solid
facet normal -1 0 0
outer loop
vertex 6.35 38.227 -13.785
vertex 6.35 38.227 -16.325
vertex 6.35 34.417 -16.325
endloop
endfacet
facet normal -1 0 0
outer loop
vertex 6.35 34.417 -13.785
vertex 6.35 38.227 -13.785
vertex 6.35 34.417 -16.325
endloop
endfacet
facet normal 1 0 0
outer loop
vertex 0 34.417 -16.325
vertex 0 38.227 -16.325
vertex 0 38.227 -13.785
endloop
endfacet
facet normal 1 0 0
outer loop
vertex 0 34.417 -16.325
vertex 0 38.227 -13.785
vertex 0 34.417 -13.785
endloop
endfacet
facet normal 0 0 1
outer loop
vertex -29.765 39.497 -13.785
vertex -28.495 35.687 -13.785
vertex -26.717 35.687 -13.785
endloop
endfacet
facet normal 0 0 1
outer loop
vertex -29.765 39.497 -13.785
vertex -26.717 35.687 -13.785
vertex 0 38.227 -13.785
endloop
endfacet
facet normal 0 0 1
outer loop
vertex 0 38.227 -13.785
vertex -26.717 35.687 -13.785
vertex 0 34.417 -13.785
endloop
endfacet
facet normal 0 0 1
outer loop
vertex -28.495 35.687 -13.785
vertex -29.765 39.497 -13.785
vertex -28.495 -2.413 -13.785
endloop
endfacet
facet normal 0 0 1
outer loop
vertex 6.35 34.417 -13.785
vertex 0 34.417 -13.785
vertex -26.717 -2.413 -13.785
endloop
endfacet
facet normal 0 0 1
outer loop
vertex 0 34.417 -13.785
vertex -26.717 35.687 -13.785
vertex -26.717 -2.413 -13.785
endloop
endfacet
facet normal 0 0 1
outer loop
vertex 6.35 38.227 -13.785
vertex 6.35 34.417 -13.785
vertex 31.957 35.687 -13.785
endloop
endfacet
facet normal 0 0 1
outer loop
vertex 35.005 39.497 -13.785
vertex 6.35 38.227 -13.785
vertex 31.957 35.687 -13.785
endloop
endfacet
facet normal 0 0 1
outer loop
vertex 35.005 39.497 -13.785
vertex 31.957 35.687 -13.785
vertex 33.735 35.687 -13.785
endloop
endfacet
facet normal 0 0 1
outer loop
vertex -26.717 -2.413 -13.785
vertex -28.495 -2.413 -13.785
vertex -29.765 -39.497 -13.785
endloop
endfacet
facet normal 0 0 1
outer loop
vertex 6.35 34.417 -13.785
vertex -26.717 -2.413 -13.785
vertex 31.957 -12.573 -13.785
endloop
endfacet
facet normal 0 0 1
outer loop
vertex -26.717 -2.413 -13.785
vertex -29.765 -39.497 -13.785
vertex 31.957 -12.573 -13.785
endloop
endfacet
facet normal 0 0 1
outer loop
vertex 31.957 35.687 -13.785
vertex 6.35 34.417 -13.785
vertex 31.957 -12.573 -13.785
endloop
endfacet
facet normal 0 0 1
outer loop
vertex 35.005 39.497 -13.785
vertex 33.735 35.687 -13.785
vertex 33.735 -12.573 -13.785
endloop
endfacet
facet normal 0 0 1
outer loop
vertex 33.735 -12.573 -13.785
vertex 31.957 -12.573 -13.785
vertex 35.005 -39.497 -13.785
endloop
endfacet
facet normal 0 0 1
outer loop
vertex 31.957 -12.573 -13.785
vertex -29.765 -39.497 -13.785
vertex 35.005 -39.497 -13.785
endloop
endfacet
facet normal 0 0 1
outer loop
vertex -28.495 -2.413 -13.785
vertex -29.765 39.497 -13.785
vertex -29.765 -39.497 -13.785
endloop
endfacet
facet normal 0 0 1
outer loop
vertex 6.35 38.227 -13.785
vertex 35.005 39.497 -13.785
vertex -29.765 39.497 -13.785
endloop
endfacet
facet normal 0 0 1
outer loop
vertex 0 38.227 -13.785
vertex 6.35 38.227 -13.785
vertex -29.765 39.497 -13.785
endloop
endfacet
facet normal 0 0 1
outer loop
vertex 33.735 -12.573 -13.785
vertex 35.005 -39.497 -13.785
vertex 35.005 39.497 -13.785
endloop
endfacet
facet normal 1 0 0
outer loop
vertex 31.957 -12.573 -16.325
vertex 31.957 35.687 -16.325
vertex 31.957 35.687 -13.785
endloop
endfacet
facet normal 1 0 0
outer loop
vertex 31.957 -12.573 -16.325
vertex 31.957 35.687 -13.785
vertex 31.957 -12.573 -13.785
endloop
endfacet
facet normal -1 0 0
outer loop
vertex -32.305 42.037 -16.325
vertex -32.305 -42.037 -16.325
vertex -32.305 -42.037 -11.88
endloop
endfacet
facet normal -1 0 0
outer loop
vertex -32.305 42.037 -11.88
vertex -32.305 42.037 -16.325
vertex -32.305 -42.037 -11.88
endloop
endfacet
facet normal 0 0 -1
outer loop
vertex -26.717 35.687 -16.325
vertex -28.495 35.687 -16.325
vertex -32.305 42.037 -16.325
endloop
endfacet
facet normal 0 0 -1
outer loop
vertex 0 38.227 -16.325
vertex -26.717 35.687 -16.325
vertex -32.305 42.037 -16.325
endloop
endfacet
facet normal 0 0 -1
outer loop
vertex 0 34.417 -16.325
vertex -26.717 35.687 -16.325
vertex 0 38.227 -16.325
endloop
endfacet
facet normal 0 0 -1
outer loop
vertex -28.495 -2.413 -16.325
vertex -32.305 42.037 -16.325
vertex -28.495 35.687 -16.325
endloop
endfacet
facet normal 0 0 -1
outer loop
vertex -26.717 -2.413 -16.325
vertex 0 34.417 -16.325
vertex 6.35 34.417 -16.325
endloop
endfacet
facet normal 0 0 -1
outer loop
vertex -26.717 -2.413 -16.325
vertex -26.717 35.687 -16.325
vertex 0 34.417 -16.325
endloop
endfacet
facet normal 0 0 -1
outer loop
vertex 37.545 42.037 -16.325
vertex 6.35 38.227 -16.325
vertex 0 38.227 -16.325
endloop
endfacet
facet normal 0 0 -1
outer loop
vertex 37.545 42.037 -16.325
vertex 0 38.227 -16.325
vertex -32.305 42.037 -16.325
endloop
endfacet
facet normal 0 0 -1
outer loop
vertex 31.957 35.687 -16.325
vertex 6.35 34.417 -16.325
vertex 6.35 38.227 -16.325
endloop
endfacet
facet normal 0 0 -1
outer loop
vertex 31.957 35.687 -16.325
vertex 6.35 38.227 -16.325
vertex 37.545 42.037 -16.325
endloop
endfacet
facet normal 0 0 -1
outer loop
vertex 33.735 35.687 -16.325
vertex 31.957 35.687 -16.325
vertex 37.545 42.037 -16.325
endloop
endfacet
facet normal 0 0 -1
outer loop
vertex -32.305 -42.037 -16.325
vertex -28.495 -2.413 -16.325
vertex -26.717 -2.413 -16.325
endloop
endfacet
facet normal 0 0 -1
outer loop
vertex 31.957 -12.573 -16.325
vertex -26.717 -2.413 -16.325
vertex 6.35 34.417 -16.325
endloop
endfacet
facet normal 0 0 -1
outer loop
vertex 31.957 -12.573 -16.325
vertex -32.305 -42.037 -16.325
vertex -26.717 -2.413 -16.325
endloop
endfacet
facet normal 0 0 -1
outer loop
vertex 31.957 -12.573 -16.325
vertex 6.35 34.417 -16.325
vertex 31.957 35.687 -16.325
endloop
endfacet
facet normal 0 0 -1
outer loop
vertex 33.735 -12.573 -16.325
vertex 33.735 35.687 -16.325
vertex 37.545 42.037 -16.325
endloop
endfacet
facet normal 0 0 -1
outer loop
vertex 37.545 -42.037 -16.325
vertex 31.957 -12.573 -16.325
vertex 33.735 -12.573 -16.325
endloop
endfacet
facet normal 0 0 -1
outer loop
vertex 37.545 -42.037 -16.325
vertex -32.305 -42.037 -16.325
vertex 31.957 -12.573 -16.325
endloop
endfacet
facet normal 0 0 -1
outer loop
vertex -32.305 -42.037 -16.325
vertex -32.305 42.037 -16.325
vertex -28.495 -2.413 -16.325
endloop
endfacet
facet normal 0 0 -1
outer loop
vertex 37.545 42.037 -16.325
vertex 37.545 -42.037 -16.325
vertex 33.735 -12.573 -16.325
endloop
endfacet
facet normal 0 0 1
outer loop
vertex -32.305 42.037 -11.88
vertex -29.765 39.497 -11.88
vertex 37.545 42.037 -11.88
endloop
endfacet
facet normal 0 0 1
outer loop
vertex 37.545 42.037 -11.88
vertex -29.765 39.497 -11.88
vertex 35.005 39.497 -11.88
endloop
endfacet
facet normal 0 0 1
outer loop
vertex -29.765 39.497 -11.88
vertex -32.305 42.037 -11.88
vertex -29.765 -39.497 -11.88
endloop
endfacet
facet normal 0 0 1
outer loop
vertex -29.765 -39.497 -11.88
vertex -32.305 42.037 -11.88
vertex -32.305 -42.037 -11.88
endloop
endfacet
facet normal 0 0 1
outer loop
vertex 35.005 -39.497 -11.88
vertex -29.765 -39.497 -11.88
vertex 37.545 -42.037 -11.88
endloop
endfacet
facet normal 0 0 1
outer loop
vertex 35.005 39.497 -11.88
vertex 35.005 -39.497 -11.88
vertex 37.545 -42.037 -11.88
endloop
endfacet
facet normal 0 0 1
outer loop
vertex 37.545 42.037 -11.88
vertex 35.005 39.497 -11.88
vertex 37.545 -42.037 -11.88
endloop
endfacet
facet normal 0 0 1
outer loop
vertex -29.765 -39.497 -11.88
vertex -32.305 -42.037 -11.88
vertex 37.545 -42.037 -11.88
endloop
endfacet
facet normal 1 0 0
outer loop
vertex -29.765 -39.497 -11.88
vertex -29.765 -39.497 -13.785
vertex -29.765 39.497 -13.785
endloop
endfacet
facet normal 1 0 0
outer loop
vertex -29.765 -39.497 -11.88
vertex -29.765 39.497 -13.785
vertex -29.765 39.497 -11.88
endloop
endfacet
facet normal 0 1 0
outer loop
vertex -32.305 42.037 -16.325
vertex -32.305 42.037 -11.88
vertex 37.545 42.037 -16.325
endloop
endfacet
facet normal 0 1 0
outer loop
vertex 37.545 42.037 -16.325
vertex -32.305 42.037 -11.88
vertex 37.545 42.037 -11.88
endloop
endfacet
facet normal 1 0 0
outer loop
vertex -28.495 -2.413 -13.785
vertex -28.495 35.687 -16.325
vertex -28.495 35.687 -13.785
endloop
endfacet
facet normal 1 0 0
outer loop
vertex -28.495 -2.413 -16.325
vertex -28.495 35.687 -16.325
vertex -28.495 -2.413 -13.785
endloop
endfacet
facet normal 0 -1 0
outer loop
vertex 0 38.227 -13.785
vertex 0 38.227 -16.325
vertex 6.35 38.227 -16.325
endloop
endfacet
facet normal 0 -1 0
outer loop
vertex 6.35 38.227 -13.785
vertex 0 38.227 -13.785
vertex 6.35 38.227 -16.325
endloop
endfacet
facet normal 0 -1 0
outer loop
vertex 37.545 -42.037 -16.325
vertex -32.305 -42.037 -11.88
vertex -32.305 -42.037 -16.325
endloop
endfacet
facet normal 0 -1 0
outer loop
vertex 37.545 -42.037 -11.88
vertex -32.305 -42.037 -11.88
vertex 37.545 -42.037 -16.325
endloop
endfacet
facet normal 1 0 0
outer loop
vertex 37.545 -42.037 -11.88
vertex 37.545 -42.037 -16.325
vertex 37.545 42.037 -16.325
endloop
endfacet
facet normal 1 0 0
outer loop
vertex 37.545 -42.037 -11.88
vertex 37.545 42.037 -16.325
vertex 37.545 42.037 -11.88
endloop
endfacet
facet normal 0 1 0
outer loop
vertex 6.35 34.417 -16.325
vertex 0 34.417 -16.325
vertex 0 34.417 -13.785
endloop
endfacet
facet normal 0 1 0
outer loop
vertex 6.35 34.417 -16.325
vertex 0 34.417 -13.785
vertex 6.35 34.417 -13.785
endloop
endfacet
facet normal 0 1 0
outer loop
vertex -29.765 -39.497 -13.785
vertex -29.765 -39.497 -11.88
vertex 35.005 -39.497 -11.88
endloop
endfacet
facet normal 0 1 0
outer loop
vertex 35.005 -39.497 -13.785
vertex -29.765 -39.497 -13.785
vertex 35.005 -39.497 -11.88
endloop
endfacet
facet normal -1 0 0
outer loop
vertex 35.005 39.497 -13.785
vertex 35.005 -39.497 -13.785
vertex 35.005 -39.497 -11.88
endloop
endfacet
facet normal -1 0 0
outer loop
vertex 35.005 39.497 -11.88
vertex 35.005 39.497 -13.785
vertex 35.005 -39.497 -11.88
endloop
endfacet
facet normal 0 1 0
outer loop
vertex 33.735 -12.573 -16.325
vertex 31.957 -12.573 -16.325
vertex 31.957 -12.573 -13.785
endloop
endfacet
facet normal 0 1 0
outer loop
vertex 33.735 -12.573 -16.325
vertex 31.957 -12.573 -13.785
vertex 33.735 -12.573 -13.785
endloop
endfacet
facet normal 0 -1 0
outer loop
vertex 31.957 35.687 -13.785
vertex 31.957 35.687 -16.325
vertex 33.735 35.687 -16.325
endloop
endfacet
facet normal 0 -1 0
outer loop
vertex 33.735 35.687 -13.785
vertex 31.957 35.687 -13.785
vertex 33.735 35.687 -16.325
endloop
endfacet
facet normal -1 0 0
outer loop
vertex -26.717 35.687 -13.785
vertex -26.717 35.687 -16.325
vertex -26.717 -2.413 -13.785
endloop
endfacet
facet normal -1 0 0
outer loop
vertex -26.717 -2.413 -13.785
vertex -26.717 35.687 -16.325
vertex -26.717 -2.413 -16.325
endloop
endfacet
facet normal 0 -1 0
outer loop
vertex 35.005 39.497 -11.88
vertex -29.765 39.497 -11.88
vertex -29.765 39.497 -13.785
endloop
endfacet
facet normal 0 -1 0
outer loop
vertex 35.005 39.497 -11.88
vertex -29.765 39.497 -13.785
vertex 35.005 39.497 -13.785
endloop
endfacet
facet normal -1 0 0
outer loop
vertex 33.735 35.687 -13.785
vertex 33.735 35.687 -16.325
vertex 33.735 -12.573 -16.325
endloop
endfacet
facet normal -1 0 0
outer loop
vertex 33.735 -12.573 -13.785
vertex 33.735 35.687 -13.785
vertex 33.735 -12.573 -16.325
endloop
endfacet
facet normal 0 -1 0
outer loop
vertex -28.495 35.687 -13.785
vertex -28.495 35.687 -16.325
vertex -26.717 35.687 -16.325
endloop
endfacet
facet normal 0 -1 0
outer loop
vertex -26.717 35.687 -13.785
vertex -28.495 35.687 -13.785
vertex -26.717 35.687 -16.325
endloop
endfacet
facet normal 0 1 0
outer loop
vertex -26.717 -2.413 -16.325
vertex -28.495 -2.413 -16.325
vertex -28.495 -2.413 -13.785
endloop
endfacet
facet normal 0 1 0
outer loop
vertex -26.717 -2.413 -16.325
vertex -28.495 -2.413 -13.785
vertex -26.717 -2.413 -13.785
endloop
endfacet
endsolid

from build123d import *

# Parameters (mm, degrees)
F0_W     = 69.85
F0_H     = 4.445
F1_DEPTH = 42.037
F2_T     = -2.54
F3_W     = 1.778
F3_H     = 38.1
F3_W_2   = 6.35
F3_H_2   = 3.81
F3_H_3   = 48.26
F4_DEPTH = 25.4


with BuildPart() as f1:
    # F0 (on Front) → F1 (new body, symmetric)
    with BuildSketch(Plane.XZ):
        with Locations((2.62026, -14.102518)):
            Rectangle(F0_W, F0_H)
    extrude(amount=F1_DEPTH, both=True)

    # F2
    f2_openings = [f1.faces().sort_by_distance(p)[0] for p in [
        (2.62026, 0, -11.880018),
    ]]
    offset(amount=F2_T, openings=f2_openings)

    # F3 (on face) → F4 (cut)
    with BuildSketch(Plane(origin=(0, 0, -16.325018), x_dir=(1, 0, 0), z_dir=(0, 0, -1))):
        with Locations((-27.60574, -16.637)):
            Rectangle(F3_W, F3_H)
        with Locations((3.175, -36.322)):
            Rectangle(F3_W_2, F3_H_2)
        with Locations((32.84626, -11.557)):
            Rectangle(F3_W, F3_H_3)
    extrude(amount=-F4_DEPTH, mode=Mode.SUBTRACT)


solid = f1.part
